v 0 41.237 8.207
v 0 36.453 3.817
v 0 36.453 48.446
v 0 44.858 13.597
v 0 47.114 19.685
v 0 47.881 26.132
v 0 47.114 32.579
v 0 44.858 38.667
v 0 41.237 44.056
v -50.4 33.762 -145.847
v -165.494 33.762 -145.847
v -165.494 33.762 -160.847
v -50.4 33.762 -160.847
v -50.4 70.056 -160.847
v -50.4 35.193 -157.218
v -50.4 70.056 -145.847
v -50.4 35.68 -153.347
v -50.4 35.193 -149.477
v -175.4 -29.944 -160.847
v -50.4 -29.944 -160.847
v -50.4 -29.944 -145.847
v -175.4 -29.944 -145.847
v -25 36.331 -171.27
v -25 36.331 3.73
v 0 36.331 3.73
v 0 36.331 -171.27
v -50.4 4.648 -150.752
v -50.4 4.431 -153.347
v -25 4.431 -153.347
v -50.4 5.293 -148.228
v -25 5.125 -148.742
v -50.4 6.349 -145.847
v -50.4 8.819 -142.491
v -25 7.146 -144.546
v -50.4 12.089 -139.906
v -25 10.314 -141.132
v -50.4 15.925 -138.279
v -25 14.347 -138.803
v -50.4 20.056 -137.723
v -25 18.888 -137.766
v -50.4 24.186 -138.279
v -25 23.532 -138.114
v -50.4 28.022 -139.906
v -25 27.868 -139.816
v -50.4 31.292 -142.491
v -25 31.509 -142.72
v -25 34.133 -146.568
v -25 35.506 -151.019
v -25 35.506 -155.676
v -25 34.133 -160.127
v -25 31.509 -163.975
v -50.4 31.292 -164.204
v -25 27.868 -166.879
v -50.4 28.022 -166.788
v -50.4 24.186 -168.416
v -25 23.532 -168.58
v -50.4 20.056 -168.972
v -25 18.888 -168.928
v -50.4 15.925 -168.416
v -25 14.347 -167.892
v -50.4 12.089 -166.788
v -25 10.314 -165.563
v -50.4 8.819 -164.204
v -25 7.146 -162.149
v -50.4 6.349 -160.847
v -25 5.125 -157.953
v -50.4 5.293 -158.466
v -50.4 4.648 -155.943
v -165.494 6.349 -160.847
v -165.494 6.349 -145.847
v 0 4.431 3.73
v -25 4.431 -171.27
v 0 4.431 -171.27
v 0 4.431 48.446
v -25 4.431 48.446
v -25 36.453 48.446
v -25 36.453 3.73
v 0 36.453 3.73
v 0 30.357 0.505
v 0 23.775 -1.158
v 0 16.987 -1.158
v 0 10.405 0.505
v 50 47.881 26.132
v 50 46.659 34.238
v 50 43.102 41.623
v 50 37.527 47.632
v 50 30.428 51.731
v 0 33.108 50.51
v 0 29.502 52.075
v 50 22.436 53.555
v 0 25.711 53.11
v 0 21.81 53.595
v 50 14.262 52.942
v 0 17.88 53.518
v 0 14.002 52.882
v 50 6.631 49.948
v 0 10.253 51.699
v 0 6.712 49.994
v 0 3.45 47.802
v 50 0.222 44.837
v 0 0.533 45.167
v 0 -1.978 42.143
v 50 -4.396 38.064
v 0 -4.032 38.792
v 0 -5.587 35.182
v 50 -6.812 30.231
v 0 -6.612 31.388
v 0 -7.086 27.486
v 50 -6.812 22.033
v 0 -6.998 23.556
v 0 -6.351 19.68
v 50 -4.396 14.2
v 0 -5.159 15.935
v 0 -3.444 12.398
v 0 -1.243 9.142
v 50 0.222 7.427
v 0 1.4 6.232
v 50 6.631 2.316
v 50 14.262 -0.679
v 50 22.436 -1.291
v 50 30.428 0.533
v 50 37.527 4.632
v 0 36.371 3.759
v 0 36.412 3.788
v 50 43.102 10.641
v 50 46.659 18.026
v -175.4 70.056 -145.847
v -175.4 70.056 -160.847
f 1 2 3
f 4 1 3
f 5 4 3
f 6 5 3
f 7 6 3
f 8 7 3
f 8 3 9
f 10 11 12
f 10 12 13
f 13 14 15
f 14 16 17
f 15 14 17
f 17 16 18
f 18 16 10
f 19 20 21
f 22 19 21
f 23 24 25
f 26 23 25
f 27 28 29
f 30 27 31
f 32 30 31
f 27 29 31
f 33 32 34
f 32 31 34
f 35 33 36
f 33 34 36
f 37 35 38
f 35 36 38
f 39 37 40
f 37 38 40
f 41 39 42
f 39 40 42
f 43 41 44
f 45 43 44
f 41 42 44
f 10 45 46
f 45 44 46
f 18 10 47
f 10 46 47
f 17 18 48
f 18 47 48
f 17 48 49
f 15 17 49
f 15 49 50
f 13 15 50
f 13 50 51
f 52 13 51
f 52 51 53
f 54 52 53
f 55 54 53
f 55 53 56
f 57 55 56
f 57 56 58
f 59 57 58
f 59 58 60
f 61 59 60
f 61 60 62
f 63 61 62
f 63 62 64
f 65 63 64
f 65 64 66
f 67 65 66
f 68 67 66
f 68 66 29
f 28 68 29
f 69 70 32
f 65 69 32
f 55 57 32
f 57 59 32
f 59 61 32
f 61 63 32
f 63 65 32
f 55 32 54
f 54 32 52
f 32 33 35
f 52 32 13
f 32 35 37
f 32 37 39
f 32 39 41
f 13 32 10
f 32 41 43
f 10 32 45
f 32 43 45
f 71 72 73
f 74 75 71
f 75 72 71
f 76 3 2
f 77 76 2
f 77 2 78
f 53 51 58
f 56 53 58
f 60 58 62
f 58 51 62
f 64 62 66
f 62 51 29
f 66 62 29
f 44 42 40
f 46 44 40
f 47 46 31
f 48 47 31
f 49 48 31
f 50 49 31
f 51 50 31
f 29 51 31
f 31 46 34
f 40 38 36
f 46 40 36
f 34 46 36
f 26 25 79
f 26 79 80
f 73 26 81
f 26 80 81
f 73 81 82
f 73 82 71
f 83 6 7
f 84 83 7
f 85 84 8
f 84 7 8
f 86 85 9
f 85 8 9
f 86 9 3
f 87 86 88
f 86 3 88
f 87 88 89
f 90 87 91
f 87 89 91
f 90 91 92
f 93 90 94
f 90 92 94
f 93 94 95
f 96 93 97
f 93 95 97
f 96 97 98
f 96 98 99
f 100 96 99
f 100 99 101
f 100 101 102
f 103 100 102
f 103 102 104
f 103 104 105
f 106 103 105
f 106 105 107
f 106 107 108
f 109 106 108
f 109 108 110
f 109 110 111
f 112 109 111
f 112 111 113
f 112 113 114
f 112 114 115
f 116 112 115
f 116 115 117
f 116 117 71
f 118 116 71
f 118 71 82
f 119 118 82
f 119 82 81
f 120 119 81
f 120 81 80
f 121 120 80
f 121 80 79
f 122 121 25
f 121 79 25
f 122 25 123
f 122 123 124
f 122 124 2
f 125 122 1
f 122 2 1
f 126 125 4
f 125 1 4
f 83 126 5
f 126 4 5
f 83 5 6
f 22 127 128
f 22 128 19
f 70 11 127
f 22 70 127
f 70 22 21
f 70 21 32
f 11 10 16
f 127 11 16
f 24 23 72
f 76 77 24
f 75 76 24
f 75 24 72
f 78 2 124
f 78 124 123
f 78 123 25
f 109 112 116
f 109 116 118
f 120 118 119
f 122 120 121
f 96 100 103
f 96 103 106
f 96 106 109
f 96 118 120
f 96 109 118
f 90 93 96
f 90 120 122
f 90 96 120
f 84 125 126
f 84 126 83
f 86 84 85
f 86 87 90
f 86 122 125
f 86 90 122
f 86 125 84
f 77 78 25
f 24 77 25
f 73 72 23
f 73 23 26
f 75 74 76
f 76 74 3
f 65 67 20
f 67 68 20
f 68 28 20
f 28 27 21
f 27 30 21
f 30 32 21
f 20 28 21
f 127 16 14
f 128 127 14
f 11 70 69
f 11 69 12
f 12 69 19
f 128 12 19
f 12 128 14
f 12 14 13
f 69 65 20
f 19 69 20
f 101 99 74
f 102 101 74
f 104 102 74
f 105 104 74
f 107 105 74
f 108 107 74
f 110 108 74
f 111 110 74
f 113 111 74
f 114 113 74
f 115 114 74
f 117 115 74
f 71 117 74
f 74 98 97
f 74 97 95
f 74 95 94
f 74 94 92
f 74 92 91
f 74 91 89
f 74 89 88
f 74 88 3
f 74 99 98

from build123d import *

# Parameters (mm, degrees)
F0_R      = 27.5
F1_DEPTH  = 50
F3_DEPTH  = 25
F4_W      = 25
F4_H      = 31.8995873117
F5_DEPTH  = 175
F6_R      = 15.6245422852
F7_DEPTH  = 25.4
F9_DEPTH  = 125
F10_W     = 115.094
F10_H     = 27.4135967448
F11_DEPTH = 25.4


with BuildPart() as f1:
    # F0 (on Right) → F1 (new body)
    with BuildSketch(Plane.YZ):
        with Locations((20.3808583319, 26.1318925768)):
            Circle(F0_R)
    extrude(amount=F1_DEPTH)

    # F2 (on face) → F3 (join)
    with BuildSketch(Plane(origin=(0, 0, 0), x_dir=(0, -1, 0), z_dir=(-1, 0, 0))):
        with BuildLine():
            ThreePointArc((-36.3306519878, 3.7297926231), (-36.3918107646, 3.7734623502), (-36.4528499765, 3.8172990431))
            Line((-36.4528499765, 3.8172990431), (-36.4528499765, 3.7297926231))
            Line((-36.4528499765, 3.7297926231), (-36.3306519878, 3.7297926231))
        make_face()
        with BuildLine():
            Line((-4.4310646761, 48.4464861105), (-36.4528499765, 48.4464861105))
            Line((-36.4528499765, 48.4464861105), (-36.4528499765, 3.8172990431))
            ThreePointArc((-36.4528499765, 3.8172990431), (-36.3918107646, 3.7734623502), (-36.3306519878, 3.7297926231))
            Line((-36.3306519878, 3.7297926231), (-4.4310646761, 3.7297926231))
            Line((-4.4310646761, 3.7297926231), (-4.4310646761, 48.4464861105))
        make_face()
    extrude(amount=F3_DEPTH)

    # F4 (on face) → F5 (join)
    with BuildSketch(Plane(origin=(0, 0, 3.7297926231), x_dir=(1, 0, 0), z_dir=(0, 0, -1))):
        with Locations((-12.5, -20.3808583319)):
            Rectangle(F4_W, F4_H)
    extrude(amount=F5_DEPTH)


with BuildPart() as f7:
    # F6 (on face) → F7 (new body)
    with BuildSketch(Plane(origin=(-25, 0, 0), x_dir=(0, -1, 0), z_dir=(-1, 0, 0))):
        with Locations((-20.0556069613, -153.3472687006)):
            Circle(F6_R)
    extrude(amount=F7_DEPTH)

    # F8 (on face) → F9 (join)
    with BuildSketch(Plane(origin=(-50.4, 0, 0), x_dir=(0, -1, 0), z_dir=(-1, 0, 0))):
        with BuildLine():
            Line((29.9443930387, -160.8472687006), (29.9443930387, -145.8472687006))
            Line((29.9443930387, -145.8472687006), (-6.3488085888, -145.8472687006))
            ThreePointArc((-6.3488085888, -145.8472687006), (-4.9180911085, -149.4766181831), (-4.4310646761, -153.3472687006))
            ThreePointArc((-4.4310646761, -153.3472687006), (-4.9180911085, -157.2179192181), (-6.3488085888, -160.8472687006))
            Line((-6.3488085888, -160.8472687006), (29.9443930387, -160.8472687006))
        make_face()
        with BuildLine():
            ThreePointArc((-4.4310646761, -153.3472687006), (-4.9180911085, -149.4766181831), (-6.3488085888, -145.8472687006))
            Line((-6.3488085888, -145.8472687006), (-33.7624053337, -145.8472687006))
            ThreePointArc((-33.7624053337, -145.8472687006), (-35.6801492464, -153.3472687006), (-33.7624053337, -160.8472687006))
            Line((-33.7624053337, -160.8472687006), (-6.3488085888, -160.8472687006))
            ThreePointArc((-6.3488085888, -160.8472687006), (-4.9180911085, -157.2179192181), (-4.4310646761, -153.3472687006))
        make_face()
        with BuildLine():
            ThreePointArc((-33.7624053337, -160.8472687006), (-35.6801492464, -153.3472687006), (-33.7624053337, -145.8472687006))
            Line((-33.7624053337, -145.8472687006), (-70.0556069613, -145.8472687006))
            Line((-70.0556069613, -145.8472687006), (-70.0556069613, -160.8472687006))
            Line((-70.0556069613, -160.8472687006), (-33.7624053337, -160.8472687006))
        make_face()
    extrude(amount=F9_DEPTH)

    # F10 (on face) → F11 (cut)
    with BuildSketch(Plane.XY.offset(-145.8472687006)):
        with Locations((-107.947, 20.0556069613)):
            Rectangle(F10_W, F10_H)
    extrude(amount=-F11_DEPTH, mode=Mode.SUBTRACT)


solid = Compound([f1.part, f7.part])
